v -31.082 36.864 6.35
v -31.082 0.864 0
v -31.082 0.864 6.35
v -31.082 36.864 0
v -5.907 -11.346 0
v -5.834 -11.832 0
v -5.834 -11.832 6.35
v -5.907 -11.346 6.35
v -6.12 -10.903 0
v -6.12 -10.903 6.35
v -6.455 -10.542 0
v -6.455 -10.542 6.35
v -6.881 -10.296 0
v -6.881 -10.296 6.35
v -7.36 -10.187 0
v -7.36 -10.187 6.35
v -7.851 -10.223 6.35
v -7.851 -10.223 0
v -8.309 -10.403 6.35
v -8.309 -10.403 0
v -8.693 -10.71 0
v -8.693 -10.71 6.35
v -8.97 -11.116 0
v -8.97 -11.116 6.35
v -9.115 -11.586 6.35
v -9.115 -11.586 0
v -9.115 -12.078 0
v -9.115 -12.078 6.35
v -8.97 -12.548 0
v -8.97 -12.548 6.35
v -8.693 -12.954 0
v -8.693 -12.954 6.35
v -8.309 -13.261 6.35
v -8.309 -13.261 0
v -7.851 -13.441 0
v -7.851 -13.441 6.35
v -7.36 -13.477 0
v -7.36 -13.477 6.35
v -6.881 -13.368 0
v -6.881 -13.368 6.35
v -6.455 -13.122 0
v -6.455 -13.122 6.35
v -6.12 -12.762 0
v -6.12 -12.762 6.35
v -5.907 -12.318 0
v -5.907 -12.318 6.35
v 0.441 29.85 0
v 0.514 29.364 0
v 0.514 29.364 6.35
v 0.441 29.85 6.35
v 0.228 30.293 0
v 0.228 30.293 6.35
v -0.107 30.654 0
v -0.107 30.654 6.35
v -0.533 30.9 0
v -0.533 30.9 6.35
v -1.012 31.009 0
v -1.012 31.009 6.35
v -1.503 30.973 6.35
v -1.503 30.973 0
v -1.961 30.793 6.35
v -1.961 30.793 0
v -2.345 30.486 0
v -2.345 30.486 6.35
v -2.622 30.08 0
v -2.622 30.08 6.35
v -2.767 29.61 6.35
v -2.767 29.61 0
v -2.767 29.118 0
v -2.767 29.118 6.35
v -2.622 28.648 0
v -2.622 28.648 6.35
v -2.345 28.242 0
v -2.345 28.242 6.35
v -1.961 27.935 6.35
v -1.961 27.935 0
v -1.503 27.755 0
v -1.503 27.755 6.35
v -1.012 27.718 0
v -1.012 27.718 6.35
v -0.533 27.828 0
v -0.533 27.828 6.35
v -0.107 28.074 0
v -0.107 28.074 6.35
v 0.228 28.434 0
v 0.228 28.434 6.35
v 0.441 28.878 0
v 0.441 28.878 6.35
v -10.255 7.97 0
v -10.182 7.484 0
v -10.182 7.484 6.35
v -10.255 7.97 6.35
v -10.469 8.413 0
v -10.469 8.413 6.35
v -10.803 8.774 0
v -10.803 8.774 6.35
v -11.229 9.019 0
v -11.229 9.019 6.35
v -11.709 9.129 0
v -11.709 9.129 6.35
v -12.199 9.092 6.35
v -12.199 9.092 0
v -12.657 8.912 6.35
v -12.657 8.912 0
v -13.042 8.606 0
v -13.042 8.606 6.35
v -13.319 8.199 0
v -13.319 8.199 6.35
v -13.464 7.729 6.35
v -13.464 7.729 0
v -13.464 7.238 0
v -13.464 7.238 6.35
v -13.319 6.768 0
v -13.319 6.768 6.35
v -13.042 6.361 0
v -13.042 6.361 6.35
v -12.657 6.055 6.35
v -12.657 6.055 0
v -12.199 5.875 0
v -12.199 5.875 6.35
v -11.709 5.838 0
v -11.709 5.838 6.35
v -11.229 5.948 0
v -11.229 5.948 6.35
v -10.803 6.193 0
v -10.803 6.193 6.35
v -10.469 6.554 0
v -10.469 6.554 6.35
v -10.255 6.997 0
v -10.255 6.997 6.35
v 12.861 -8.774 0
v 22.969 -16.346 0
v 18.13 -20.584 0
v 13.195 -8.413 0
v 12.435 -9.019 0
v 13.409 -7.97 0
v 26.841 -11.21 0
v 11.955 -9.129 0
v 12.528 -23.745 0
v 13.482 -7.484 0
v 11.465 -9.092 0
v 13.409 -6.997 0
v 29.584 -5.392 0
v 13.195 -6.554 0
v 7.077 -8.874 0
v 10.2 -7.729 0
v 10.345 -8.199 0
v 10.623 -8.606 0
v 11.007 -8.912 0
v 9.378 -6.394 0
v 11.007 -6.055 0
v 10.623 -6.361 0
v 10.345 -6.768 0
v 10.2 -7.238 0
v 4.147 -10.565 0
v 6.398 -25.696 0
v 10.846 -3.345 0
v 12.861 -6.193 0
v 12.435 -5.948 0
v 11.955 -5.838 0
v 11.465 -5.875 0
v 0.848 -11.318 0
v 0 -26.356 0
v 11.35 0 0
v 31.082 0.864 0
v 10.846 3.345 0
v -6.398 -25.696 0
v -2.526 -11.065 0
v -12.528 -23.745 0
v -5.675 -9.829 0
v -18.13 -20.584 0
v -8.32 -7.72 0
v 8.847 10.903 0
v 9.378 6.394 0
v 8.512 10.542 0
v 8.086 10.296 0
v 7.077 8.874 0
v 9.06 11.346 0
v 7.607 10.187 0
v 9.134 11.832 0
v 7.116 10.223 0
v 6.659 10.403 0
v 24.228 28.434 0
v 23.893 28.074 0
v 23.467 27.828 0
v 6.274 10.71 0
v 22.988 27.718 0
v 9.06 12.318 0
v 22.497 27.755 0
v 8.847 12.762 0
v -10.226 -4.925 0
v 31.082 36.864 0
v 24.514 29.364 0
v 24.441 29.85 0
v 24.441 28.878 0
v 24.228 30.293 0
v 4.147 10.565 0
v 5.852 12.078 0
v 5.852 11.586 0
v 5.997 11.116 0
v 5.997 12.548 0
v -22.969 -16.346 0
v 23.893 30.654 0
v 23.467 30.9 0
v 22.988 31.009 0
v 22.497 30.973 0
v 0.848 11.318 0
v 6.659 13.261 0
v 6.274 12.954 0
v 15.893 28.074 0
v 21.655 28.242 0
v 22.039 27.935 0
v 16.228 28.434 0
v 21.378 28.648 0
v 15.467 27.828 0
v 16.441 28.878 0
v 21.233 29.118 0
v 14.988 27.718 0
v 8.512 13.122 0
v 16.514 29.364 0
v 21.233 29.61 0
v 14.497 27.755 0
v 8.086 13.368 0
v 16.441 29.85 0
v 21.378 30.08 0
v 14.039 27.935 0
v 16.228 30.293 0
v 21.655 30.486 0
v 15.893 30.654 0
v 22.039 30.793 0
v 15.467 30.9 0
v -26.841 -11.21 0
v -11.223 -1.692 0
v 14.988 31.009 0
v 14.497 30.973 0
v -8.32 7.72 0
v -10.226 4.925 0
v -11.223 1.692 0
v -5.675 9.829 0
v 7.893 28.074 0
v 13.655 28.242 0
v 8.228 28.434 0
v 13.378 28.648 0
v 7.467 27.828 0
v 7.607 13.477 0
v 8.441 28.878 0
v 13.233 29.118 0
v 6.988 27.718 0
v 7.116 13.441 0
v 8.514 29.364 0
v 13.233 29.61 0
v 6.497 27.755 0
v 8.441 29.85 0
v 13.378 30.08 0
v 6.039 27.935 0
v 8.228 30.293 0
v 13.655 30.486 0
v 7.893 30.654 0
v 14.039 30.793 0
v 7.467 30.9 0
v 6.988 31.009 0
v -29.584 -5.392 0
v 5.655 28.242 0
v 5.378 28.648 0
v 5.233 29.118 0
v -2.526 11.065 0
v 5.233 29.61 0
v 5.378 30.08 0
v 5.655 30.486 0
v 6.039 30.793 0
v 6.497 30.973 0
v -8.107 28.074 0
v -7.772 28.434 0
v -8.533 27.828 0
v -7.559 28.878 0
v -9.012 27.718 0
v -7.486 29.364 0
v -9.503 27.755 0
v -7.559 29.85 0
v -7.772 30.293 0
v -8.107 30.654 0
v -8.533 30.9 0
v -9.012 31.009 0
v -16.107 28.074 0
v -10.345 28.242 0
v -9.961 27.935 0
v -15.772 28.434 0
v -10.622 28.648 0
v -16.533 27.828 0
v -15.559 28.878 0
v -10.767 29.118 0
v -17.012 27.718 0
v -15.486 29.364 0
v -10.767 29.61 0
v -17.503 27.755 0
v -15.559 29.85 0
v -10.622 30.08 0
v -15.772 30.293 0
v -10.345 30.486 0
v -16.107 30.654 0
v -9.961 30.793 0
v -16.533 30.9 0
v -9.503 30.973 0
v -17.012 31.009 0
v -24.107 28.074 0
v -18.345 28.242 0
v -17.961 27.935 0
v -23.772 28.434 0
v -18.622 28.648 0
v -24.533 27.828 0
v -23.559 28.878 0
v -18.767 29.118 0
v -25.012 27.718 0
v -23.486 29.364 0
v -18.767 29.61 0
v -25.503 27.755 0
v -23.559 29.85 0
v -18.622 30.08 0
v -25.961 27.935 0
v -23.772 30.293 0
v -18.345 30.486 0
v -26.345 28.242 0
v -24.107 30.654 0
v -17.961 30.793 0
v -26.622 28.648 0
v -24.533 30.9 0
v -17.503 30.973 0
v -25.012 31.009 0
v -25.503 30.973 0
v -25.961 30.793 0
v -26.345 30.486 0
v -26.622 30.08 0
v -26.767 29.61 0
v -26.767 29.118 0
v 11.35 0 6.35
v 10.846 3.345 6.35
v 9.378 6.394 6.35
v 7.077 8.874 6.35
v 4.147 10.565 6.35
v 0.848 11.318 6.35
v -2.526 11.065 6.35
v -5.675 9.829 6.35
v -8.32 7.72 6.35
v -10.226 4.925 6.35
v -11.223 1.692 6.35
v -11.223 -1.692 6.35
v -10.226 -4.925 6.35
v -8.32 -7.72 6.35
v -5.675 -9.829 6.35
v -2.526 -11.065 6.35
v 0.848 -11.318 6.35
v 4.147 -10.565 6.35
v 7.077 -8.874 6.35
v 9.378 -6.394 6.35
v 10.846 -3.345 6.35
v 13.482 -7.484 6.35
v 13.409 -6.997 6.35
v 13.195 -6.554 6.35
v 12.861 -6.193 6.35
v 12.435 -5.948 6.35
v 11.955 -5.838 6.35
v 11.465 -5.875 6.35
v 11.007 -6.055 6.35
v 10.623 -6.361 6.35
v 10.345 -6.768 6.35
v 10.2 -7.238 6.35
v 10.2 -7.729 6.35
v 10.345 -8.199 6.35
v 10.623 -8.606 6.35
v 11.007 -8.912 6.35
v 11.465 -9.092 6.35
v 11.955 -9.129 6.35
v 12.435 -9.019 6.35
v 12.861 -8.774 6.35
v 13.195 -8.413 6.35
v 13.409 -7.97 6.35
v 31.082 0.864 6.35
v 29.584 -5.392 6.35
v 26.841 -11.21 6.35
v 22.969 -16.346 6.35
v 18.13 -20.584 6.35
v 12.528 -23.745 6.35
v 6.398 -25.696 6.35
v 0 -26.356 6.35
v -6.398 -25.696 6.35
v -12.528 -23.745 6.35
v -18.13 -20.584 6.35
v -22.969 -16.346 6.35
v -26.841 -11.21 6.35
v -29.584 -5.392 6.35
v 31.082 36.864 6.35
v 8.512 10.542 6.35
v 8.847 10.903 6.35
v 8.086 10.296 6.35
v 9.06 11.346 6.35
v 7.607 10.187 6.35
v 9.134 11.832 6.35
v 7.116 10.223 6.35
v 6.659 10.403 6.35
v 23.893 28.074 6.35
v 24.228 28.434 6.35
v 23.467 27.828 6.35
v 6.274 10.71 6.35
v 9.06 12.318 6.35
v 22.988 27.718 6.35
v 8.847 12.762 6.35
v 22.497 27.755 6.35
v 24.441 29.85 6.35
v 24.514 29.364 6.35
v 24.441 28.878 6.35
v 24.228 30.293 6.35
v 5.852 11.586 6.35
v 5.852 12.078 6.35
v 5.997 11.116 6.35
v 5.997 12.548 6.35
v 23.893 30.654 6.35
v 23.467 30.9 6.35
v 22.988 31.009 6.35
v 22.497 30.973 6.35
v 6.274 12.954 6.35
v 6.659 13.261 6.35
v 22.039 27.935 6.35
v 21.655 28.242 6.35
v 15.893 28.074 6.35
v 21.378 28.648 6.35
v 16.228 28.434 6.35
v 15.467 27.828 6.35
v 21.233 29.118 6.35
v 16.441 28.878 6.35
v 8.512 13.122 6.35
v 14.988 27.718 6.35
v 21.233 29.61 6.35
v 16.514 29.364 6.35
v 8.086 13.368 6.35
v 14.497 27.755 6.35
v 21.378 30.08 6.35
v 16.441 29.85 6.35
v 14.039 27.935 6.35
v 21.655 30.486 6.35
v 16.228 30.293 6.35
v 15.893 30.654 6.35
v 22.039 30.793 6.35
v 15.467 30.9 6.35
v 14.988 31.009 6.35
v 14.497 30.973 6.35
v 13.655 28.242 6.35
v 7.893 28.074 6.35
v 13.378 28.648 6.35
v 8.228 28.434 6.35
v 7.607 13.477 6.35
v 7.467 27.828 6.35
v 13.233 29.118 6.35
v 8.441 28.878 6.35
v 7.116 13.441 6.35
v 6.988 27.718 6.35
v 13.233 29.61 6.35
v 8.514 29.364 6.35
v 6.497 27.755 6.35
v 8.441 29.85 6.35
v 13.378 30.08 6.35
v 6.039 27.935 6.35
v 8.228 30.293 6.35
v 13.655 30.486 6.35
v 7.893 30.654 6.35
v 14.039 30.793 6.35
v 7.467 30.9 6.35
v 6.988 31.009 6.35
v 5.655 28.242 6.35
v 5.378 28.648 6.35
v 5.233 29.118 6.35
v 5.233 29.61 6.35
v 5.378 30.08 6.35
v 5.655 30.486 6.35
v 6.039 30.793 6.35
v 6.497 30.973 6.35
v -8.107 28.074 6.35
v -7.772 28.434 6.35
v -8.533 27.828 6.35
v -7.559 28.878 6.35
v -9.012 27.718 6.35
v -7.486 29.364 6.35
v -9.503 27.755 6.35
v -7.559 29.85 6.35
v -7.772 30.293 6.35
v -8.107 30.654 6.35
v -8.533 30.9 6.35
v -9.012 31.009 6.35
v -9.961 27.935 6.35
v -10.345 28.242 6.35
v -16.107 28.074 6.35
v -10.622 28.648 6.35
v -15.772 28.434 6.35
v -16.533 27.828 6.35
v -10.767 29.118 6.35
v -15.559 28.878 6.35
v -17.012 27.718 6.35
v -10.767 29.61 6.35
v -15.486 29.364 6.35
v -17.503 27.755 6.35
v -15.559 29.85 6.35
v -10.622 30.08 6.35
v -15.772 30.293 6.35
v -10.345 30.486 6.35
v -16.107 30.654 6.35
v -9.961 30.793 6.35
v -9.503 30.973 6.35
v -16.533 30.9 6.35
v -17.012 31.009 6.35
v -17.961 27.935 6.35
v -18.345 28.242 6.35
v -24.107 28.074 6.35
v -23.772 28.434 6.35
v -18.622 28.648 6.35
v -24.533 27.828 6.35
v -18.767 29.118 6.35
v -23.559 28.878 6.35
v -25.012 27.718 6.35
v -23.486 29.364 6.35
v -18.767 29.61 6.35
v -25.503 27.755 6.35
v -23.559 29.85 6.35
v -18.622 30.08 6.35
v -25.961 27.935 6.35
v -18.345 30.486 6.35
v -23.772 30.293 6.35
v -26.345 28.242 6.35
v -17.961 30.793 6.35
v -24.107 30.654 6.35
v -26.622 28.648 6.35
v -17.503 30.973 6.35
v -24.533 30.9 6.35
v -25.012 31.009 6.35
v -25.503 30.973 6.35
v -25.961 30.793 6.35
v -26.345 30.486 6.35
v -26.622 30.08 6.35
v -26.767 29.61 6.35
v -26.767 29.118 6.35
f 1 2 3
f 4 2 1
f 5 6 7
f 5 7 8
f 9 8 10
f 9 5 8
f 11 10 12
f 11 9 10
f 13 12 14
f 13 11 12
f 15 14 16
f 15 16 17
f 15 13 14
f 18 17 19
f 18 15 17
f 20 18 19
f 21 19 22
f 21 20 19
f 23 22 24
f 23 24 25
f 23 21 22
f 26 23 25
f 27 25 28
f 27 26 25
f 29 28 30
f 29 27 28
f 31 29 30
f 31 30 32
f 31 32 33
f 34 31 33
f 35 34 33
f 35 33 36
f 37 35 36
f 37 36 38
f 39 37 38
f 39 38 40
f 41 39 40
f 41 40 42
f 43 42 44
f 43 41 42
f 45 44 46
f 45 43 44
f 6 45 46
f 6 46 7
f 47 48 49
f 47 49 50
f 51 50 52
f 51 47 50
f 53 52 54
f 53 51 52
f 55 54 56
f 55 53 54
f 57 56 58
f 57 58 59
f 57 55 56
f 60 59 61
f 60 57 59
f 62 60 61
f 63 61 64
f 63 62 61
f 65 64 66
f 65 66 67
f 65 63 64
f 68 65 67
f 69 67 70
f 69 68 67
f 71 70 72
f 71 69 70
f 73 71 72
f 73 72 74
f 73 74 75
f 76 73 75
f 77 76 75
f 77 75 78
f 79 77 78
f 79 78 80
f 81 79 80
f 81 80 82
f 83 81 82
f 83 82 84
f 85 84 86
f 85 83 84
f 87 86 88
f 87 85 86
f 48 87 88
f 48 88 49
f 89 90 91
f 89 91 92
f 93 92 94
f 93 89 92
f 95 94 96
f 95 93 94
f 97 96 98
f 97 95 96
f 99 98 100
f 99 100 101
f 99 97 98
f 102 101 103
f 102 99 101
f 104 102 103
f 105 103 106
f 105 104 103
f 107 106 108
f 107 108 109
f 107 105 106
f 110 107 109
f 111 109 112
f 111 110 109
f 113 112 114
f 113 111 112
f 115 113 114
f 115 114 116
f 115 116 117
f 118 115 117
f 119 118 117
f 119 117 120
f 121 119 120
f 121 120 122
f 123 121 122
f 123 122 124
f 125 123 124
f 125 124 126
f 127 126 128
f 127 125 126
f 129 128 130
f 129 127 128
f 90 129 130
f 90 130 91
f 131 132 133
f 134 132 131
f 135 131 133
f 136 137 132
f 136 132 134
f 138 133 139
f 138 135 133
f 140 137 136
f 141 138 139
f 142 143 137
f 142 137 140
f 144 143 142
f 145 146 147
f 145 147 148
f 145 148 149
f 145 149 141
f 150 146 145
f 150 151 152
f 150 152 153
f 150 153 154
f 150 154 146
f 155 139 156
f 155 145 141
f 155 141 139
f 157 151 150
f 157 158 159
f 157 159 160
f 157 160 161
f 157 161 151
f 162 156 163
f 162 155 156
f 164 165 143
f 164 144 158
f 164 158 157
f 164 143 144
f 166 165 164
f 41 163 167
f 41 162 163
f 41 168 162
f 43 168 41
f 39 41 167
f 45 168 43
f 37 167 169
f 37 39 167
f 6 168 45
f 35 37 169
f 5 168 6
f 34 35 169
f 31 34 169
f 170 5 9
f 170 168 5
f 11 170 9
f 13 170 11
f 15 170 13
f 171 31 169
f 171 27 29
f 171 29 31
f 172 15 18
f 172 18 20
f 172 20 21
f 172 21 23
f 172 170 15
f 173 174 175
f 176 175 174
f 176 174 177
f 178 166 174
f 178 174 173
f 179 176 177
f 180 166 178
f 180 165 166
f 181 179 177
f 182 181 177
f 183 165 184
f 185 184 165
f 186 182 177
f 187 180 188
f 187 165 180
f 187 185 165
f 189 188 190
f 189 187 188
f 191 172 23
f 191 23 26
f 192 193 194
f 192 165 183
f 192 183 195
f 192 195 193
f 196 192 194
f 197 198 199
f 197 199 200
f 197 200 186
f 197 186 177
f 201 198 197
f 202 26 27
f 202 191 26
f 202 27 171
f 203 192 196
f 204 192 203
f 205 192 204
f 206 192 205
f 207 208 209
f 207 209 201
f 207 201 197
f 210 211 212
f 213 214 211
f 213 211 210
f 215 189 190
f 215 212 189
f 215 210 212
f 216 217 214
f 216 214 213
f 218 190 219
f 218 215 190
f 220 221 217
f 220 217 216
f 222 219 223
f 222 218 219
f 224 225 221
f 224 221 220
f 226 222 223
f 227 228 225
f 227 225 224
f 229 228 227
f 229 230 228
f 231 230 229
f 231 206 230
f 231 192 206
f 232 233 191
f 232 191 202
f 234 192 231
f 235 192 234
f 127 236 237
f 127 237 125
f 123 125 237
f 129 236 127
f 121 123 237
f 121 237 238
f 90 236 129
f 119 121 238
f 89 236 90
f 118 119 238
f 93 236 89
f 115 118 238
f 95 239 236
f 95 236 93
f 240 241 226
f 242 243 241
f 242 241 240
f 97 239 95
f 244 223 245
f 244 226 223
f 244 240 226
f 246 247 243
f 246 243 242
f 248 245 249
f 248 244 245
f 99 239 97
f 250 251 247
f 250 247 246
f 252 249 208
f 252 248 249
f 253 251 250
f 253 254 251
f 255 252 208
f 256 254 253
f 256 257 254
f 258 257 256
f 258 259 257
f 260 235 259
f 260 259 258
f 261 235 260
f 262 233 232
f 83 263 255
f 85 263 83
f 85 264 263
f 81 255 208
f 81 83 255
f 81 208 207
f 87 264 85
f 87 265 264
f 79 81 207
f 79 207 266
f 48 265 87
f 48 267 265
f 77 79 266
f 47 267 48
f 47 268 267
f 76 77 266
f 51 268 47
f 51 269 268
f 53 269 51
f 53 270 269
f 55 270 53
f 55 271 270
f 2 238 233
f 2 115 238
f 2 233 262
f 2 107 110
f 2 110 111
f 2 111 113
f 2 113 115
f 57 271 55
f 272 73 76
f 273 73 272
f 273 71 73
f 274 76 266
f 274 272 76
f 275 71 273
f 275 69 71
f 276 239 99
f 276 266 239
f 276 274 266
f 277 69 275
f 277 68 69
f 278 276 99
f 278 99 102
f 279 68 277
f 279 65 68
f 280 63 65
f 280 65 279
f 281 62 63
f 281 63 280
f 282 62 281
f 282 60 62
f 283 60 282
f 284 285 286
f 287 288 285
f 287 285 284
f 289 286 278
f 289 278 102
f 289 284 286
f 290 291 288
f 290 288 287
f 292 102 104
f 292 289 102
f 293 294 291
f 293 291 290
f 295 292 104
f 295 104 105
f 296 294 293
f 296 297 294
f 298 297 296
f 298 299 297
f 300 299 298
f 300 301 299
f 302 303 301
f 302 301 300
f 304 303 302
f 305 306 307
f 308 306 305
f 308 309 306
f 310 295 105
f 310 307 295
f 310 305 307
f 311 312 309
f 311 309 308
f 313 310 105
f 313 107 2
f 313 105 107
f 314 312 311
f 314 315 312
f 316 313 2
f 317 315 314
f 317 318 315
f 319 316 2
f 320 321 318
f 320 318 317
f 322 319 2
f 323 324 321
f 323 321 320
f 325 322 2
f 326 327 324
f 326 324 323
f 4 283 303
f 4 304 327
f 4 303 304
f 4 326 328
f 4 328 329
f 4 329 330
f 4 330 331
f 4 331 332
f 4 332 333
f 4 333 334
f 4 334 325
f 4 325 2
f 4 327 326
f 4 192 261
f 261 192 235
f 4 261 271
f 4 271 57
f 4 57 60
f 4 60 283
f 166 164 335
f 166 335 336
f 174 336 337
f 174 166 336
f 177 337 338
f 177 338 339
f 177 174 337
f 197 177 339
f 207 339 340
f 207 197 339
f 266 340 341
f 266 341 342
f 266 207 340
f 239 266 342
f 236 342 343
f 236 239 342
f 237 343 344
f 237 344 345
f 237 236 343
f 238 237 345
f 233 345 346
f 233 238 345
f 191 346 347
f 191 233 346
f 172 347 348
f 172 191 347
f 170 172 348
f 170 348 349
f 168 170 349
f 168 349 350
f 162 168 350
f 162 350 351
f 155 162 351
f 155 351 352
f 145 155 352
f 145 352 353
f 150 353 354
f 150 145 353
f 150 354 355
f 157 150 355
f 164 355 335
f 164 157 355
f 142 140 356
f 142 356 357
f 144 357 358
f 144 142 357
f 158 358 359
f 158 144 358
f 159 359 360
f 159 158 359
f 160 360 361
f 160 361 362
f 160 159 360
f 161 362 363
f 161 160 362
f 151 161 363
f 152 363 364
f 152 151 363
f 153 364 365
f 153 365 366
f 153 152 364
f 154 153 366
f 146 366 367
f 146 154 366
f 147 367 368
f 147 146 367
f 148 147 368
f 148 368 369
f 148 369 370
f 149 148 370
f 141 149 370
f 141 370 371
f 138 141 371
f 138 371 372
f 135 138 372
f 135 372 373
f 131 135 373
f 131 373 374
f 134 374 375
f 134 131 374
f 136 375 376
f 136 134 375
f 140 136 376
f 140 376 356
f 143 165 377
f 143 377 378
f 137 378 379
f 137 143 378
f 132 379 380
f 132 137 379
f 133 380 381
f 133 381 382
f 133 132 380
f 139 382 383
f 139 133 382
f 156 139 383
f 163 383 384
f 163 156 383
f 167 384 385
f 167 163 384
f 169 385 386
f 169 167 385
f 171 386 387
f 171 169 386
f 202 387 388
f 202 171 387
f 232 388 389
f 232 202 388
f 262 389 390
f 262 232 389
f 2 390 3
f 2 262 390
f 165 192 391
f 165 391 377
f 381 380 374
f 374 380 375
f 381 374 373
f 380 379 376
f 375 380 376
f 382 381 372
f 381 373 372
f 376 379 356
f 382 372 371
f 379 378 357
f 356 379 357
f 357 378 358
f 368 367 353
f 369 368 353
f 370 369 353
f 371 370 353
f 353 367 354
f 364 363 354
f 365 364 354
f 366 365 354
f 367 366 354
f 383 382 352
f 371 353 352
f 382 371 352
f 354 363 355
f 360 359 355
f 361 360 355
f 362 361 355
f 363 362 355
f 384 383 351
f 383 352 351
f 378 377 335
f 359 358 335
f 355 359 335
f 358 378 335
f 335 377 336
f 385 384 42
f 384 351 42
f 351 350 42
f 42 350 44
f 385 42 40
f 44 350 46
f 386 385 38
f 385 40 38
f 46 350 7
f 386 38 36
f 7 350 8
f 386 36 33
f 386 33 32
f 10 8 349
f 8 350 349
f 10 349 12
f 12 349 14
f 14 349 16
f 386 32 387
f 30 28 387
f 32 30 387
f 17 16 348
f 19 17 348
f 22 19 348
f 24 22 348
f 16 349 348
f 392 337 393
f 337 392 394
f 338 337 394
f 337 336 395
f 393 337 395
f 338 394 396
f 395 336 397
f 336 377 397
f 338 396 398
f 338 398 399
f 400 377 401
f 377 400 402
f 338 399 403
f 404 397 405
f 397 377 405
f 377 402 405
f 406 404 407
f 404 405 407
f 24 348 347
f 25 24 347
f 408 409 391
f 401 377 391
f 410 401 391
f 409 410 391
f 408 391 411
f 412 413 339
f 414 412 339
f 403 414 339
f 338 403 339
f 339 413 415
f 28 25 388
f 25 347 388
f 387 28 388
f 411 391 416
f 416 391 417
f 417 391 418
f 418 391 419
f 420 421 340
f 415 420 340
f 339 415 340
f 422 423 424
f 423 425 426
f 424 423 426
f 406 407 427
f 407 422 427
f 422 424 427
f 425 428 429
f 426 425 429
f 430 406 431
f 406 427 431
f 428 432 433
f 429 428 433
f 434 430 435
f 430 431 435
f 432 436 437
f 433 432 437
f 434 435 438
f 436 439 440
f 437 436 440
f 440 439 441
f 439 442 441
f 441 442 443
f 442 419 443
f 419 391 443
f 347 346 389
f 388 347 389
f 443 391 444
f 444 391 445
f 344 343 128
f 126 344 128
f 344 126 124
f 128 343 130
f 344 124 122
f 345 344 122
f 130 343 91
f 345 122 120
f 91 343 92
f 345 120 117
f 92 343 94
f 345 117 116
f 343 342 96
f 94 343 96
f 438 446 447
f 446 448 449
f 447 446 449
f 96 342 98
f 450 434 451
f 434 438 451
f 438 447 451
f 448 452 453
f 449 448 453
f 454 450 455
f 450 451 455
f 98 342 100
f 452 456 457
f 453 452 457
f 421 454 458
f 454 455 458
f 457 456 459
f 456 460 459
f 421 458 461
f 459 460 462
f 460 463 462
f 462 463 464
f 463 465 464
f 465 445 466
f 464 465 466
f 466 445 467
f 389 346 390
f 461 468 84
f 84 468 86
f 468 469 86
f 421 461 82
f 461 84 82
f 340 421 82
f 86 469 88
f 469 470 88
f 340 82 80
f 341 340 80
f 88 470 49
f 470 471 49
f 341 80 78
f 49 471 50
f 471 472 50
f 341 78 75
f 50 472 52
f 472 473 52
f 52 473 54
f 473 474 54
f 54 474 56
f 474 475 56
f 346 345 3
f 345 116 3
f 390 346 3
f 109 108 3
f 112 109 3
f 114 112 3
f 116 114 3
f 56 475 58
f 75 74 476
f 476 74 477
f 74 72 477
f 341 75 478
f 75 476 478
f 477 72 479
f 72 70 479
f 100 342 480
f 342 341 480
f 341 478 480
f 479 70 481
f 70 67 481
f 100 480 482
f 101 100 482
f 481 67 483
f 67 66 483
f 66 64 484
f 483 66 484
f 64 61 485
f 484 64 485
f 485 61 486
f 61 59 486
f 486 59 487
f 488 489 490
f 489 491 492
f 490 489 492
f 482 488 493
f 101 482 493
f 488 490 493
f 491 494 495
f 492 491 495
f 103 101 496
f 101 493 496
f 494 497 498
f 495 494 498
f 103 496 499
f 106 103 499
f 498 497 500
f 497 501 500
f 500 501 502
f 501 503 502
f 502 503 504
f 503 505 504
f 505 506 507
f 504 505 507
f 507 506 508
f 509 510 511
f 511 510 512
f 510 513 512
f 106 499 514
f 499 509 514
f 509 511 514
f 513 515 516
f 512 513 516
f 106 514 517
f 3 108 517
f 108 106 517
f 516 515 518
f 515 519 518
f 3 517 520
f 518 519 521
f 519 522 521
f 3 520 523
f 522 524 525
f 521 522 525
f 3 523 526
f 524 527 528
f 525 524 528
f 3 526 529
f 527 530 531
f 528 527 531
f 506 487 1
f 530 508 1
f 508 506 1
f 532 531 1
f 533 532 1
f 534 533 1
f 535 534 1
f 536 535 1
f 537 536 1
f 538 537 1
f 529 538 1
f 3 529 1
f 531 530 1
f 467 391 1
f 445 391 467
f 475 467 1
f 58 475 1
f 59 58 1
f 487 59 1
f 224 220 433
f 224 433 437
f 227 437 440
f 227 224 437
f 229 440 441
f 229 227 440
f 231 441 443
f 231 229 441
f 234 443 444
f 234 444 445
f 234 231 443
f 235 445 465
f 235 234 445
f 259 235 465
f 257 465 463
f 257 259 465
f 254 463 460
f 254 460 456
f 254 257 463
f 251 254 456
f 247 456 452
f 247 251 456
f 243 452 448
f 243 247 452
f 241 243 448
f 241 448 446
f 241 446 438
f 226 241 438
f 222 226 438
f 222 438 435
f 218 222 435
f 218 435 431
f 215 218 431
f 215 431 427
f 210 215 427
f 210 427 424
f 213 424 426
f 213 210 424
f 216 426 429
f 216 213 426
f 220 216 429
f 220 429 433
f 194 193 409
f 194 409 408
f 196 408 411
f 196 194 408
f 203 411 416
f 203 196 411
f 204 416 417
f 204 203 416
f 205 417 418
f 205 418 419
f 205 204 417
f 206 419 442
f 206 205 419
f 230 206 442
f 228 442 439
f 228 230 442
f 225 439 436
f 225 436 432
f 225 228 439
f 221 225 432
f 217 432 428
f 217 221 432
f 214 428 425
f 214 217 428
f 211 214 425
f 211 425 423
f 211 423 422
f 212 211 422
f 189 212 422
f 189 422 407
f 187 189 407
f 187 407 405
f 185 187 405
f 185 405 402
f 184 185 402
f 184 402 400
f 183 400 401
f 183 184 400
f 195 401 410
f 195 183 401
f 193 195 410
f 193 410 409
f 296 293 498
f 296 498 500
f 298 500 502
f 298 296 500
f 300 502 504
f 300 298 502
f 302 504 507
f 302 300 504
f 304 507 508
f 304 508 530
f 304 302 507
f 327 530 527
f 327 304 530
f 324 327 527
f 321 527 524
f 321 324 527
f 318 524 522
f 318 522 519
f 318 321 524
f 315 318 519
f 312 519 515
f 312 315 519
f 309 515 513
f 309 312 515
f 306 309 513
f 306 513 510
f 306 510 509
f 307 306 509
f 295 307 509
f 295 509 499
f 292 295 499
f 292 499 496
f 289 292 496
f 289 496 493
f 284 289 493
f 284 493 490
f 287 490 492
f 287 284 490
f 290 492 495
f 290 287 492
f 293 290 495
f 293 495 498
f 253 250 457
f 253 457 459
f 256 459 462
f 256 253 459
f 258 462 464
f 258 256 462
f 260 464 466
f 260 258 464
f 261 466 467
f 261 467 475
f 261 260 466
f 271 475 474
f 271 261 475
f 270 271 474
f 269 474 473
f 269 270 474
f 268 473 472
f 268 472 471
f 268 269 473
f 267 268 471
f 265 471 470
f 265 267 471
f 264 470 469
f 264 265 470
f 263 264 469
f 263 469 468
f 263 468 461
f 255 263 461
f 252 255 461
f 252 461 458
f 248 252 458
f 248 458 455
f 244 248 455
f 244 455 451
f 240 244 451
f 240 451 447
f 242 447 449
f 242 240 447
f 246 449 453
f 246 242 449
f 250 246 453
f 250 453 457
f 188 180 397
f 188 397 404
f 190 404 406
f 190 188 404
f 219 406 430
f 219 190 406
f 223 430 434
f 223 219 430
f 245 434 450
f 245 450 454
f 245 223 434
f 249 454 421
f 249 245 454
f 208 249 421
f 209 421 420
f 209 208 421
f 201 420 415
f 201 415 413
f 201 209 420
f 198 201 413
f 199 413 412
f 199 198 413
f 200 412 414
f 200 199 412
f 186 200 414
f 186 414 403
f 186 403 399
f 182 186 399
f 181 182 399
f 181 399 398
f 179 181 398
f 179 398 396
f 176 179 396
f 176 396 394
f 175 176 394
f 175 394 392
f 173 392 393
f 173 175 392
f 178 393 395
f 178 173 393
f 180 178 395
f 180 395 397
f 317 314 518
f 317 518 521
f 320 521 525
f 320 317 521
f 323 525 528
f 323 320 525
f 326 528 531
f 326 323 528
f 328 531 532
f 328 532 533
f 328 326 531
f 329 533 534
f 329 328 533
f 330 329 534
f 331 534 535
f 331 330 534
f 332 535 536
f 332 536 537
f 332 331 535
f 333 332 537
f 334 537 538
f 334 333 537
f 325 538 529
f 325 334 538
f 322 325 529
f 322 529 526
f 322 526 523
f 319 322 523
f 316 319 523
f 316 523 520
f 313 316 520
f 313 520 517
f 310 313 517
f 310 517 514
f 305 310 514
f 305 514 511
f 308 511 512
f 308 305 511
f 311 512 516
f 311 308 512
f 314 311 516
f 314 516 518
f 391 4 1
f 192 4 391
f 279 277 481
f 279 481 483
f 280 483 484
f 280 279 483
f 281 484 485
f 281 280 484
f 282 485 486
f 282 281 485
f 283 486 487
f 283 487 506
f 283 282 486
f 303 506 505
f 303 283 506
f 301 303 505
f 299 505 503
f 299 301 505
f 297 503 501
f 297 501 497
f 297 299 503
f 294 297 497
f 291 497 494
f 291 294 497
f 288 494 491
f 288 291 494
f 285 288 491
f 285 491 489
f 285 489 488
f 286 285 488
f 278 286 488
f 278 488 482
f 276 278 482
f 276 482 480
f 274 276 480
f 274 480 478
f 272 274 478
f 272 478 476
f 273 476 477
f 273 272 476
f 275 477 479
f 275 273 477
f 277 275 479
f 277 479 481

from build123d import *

# Parameters (mm, degrees)
SKETCH1_R           = 11.35
SKETCH1_R_2         = 1.65
BOSS_EXTRUDE1_DEPTH = 6.35


with BuildPart() as part:
    # Sketch1 → Boss-Extrude1 (new body)
    with BuildSketch(Plane.XY):
        with BuildLine():
            Line((-31.082201122, 36.863873201), (31.082201122, 36.863873201))
            Line((31.082201122, 36.863873201), (31.082201122, 0.863873201))
            ThreePointArc((31.082201122, 0.863873201), (0, -26.356191916), (-31.082201122, 0.863873201))
            Line((-31.082201122, 0.863873201), (-31.082201122, 36.863873201))
        make_face()
        Circle(SKETCH1_R, mode=Mode.SUBTRACT)
        with Locations((-11.832036089, 7.483510005)):
            Circle(SKETCH1_R_2, mode=Mode.SUBTRACT)
        with Locations((7.483510005, 11.832036089)):
            Circle(SKETCH1_R_2, mode=Mode.SUBTRACT)
        with Locations((11.832036089, -7.483510005)):
            Circle(SKETCH1_R_2, mode=Mode.SUBTRACT)
        with Locations((-7.483510005, -11.832036089)):
            Circle(SKETCH1_R_2, mode=Mode.SUBTRACT)
        with Locations((-25.135580542, 29.363873201)):
            Circle(SKETCH1_R_2, mode=Mode.SUBTRACT)
        with Locations((-17.135580542, 29.363873201)):
            Circle(SKETCH1_R_2, mode=Mode.SUBTRACT)
        with Locations((-9.135580542, 29.363873201)):
            Circle(SKETCH1_R_2, mode=Mode.SUBTRACT)
        with Locations((-1.135580542, 29.363873201)):
            Circle(SKETCH1_R_2, mode=Mode.SUBTRACT)
        with Locations((6.864419458, 29.363873201)):
            Circle(SKETCH1_R_2, mode=Mode.SUBTRACT)
        with Locations((14.864419458, 29.363873201)):
            Circle(SKETCH1_R_2, mode=Mode.SUBTRACT)
        with Locations((22.864419458, 29.363873201)):
            Circle(SKETCH1_R_2, mode=Mode.SUBTRACT)
    extrude(amount=BOSS_EXTRUDE1_DEPTH)


solid = part.part
